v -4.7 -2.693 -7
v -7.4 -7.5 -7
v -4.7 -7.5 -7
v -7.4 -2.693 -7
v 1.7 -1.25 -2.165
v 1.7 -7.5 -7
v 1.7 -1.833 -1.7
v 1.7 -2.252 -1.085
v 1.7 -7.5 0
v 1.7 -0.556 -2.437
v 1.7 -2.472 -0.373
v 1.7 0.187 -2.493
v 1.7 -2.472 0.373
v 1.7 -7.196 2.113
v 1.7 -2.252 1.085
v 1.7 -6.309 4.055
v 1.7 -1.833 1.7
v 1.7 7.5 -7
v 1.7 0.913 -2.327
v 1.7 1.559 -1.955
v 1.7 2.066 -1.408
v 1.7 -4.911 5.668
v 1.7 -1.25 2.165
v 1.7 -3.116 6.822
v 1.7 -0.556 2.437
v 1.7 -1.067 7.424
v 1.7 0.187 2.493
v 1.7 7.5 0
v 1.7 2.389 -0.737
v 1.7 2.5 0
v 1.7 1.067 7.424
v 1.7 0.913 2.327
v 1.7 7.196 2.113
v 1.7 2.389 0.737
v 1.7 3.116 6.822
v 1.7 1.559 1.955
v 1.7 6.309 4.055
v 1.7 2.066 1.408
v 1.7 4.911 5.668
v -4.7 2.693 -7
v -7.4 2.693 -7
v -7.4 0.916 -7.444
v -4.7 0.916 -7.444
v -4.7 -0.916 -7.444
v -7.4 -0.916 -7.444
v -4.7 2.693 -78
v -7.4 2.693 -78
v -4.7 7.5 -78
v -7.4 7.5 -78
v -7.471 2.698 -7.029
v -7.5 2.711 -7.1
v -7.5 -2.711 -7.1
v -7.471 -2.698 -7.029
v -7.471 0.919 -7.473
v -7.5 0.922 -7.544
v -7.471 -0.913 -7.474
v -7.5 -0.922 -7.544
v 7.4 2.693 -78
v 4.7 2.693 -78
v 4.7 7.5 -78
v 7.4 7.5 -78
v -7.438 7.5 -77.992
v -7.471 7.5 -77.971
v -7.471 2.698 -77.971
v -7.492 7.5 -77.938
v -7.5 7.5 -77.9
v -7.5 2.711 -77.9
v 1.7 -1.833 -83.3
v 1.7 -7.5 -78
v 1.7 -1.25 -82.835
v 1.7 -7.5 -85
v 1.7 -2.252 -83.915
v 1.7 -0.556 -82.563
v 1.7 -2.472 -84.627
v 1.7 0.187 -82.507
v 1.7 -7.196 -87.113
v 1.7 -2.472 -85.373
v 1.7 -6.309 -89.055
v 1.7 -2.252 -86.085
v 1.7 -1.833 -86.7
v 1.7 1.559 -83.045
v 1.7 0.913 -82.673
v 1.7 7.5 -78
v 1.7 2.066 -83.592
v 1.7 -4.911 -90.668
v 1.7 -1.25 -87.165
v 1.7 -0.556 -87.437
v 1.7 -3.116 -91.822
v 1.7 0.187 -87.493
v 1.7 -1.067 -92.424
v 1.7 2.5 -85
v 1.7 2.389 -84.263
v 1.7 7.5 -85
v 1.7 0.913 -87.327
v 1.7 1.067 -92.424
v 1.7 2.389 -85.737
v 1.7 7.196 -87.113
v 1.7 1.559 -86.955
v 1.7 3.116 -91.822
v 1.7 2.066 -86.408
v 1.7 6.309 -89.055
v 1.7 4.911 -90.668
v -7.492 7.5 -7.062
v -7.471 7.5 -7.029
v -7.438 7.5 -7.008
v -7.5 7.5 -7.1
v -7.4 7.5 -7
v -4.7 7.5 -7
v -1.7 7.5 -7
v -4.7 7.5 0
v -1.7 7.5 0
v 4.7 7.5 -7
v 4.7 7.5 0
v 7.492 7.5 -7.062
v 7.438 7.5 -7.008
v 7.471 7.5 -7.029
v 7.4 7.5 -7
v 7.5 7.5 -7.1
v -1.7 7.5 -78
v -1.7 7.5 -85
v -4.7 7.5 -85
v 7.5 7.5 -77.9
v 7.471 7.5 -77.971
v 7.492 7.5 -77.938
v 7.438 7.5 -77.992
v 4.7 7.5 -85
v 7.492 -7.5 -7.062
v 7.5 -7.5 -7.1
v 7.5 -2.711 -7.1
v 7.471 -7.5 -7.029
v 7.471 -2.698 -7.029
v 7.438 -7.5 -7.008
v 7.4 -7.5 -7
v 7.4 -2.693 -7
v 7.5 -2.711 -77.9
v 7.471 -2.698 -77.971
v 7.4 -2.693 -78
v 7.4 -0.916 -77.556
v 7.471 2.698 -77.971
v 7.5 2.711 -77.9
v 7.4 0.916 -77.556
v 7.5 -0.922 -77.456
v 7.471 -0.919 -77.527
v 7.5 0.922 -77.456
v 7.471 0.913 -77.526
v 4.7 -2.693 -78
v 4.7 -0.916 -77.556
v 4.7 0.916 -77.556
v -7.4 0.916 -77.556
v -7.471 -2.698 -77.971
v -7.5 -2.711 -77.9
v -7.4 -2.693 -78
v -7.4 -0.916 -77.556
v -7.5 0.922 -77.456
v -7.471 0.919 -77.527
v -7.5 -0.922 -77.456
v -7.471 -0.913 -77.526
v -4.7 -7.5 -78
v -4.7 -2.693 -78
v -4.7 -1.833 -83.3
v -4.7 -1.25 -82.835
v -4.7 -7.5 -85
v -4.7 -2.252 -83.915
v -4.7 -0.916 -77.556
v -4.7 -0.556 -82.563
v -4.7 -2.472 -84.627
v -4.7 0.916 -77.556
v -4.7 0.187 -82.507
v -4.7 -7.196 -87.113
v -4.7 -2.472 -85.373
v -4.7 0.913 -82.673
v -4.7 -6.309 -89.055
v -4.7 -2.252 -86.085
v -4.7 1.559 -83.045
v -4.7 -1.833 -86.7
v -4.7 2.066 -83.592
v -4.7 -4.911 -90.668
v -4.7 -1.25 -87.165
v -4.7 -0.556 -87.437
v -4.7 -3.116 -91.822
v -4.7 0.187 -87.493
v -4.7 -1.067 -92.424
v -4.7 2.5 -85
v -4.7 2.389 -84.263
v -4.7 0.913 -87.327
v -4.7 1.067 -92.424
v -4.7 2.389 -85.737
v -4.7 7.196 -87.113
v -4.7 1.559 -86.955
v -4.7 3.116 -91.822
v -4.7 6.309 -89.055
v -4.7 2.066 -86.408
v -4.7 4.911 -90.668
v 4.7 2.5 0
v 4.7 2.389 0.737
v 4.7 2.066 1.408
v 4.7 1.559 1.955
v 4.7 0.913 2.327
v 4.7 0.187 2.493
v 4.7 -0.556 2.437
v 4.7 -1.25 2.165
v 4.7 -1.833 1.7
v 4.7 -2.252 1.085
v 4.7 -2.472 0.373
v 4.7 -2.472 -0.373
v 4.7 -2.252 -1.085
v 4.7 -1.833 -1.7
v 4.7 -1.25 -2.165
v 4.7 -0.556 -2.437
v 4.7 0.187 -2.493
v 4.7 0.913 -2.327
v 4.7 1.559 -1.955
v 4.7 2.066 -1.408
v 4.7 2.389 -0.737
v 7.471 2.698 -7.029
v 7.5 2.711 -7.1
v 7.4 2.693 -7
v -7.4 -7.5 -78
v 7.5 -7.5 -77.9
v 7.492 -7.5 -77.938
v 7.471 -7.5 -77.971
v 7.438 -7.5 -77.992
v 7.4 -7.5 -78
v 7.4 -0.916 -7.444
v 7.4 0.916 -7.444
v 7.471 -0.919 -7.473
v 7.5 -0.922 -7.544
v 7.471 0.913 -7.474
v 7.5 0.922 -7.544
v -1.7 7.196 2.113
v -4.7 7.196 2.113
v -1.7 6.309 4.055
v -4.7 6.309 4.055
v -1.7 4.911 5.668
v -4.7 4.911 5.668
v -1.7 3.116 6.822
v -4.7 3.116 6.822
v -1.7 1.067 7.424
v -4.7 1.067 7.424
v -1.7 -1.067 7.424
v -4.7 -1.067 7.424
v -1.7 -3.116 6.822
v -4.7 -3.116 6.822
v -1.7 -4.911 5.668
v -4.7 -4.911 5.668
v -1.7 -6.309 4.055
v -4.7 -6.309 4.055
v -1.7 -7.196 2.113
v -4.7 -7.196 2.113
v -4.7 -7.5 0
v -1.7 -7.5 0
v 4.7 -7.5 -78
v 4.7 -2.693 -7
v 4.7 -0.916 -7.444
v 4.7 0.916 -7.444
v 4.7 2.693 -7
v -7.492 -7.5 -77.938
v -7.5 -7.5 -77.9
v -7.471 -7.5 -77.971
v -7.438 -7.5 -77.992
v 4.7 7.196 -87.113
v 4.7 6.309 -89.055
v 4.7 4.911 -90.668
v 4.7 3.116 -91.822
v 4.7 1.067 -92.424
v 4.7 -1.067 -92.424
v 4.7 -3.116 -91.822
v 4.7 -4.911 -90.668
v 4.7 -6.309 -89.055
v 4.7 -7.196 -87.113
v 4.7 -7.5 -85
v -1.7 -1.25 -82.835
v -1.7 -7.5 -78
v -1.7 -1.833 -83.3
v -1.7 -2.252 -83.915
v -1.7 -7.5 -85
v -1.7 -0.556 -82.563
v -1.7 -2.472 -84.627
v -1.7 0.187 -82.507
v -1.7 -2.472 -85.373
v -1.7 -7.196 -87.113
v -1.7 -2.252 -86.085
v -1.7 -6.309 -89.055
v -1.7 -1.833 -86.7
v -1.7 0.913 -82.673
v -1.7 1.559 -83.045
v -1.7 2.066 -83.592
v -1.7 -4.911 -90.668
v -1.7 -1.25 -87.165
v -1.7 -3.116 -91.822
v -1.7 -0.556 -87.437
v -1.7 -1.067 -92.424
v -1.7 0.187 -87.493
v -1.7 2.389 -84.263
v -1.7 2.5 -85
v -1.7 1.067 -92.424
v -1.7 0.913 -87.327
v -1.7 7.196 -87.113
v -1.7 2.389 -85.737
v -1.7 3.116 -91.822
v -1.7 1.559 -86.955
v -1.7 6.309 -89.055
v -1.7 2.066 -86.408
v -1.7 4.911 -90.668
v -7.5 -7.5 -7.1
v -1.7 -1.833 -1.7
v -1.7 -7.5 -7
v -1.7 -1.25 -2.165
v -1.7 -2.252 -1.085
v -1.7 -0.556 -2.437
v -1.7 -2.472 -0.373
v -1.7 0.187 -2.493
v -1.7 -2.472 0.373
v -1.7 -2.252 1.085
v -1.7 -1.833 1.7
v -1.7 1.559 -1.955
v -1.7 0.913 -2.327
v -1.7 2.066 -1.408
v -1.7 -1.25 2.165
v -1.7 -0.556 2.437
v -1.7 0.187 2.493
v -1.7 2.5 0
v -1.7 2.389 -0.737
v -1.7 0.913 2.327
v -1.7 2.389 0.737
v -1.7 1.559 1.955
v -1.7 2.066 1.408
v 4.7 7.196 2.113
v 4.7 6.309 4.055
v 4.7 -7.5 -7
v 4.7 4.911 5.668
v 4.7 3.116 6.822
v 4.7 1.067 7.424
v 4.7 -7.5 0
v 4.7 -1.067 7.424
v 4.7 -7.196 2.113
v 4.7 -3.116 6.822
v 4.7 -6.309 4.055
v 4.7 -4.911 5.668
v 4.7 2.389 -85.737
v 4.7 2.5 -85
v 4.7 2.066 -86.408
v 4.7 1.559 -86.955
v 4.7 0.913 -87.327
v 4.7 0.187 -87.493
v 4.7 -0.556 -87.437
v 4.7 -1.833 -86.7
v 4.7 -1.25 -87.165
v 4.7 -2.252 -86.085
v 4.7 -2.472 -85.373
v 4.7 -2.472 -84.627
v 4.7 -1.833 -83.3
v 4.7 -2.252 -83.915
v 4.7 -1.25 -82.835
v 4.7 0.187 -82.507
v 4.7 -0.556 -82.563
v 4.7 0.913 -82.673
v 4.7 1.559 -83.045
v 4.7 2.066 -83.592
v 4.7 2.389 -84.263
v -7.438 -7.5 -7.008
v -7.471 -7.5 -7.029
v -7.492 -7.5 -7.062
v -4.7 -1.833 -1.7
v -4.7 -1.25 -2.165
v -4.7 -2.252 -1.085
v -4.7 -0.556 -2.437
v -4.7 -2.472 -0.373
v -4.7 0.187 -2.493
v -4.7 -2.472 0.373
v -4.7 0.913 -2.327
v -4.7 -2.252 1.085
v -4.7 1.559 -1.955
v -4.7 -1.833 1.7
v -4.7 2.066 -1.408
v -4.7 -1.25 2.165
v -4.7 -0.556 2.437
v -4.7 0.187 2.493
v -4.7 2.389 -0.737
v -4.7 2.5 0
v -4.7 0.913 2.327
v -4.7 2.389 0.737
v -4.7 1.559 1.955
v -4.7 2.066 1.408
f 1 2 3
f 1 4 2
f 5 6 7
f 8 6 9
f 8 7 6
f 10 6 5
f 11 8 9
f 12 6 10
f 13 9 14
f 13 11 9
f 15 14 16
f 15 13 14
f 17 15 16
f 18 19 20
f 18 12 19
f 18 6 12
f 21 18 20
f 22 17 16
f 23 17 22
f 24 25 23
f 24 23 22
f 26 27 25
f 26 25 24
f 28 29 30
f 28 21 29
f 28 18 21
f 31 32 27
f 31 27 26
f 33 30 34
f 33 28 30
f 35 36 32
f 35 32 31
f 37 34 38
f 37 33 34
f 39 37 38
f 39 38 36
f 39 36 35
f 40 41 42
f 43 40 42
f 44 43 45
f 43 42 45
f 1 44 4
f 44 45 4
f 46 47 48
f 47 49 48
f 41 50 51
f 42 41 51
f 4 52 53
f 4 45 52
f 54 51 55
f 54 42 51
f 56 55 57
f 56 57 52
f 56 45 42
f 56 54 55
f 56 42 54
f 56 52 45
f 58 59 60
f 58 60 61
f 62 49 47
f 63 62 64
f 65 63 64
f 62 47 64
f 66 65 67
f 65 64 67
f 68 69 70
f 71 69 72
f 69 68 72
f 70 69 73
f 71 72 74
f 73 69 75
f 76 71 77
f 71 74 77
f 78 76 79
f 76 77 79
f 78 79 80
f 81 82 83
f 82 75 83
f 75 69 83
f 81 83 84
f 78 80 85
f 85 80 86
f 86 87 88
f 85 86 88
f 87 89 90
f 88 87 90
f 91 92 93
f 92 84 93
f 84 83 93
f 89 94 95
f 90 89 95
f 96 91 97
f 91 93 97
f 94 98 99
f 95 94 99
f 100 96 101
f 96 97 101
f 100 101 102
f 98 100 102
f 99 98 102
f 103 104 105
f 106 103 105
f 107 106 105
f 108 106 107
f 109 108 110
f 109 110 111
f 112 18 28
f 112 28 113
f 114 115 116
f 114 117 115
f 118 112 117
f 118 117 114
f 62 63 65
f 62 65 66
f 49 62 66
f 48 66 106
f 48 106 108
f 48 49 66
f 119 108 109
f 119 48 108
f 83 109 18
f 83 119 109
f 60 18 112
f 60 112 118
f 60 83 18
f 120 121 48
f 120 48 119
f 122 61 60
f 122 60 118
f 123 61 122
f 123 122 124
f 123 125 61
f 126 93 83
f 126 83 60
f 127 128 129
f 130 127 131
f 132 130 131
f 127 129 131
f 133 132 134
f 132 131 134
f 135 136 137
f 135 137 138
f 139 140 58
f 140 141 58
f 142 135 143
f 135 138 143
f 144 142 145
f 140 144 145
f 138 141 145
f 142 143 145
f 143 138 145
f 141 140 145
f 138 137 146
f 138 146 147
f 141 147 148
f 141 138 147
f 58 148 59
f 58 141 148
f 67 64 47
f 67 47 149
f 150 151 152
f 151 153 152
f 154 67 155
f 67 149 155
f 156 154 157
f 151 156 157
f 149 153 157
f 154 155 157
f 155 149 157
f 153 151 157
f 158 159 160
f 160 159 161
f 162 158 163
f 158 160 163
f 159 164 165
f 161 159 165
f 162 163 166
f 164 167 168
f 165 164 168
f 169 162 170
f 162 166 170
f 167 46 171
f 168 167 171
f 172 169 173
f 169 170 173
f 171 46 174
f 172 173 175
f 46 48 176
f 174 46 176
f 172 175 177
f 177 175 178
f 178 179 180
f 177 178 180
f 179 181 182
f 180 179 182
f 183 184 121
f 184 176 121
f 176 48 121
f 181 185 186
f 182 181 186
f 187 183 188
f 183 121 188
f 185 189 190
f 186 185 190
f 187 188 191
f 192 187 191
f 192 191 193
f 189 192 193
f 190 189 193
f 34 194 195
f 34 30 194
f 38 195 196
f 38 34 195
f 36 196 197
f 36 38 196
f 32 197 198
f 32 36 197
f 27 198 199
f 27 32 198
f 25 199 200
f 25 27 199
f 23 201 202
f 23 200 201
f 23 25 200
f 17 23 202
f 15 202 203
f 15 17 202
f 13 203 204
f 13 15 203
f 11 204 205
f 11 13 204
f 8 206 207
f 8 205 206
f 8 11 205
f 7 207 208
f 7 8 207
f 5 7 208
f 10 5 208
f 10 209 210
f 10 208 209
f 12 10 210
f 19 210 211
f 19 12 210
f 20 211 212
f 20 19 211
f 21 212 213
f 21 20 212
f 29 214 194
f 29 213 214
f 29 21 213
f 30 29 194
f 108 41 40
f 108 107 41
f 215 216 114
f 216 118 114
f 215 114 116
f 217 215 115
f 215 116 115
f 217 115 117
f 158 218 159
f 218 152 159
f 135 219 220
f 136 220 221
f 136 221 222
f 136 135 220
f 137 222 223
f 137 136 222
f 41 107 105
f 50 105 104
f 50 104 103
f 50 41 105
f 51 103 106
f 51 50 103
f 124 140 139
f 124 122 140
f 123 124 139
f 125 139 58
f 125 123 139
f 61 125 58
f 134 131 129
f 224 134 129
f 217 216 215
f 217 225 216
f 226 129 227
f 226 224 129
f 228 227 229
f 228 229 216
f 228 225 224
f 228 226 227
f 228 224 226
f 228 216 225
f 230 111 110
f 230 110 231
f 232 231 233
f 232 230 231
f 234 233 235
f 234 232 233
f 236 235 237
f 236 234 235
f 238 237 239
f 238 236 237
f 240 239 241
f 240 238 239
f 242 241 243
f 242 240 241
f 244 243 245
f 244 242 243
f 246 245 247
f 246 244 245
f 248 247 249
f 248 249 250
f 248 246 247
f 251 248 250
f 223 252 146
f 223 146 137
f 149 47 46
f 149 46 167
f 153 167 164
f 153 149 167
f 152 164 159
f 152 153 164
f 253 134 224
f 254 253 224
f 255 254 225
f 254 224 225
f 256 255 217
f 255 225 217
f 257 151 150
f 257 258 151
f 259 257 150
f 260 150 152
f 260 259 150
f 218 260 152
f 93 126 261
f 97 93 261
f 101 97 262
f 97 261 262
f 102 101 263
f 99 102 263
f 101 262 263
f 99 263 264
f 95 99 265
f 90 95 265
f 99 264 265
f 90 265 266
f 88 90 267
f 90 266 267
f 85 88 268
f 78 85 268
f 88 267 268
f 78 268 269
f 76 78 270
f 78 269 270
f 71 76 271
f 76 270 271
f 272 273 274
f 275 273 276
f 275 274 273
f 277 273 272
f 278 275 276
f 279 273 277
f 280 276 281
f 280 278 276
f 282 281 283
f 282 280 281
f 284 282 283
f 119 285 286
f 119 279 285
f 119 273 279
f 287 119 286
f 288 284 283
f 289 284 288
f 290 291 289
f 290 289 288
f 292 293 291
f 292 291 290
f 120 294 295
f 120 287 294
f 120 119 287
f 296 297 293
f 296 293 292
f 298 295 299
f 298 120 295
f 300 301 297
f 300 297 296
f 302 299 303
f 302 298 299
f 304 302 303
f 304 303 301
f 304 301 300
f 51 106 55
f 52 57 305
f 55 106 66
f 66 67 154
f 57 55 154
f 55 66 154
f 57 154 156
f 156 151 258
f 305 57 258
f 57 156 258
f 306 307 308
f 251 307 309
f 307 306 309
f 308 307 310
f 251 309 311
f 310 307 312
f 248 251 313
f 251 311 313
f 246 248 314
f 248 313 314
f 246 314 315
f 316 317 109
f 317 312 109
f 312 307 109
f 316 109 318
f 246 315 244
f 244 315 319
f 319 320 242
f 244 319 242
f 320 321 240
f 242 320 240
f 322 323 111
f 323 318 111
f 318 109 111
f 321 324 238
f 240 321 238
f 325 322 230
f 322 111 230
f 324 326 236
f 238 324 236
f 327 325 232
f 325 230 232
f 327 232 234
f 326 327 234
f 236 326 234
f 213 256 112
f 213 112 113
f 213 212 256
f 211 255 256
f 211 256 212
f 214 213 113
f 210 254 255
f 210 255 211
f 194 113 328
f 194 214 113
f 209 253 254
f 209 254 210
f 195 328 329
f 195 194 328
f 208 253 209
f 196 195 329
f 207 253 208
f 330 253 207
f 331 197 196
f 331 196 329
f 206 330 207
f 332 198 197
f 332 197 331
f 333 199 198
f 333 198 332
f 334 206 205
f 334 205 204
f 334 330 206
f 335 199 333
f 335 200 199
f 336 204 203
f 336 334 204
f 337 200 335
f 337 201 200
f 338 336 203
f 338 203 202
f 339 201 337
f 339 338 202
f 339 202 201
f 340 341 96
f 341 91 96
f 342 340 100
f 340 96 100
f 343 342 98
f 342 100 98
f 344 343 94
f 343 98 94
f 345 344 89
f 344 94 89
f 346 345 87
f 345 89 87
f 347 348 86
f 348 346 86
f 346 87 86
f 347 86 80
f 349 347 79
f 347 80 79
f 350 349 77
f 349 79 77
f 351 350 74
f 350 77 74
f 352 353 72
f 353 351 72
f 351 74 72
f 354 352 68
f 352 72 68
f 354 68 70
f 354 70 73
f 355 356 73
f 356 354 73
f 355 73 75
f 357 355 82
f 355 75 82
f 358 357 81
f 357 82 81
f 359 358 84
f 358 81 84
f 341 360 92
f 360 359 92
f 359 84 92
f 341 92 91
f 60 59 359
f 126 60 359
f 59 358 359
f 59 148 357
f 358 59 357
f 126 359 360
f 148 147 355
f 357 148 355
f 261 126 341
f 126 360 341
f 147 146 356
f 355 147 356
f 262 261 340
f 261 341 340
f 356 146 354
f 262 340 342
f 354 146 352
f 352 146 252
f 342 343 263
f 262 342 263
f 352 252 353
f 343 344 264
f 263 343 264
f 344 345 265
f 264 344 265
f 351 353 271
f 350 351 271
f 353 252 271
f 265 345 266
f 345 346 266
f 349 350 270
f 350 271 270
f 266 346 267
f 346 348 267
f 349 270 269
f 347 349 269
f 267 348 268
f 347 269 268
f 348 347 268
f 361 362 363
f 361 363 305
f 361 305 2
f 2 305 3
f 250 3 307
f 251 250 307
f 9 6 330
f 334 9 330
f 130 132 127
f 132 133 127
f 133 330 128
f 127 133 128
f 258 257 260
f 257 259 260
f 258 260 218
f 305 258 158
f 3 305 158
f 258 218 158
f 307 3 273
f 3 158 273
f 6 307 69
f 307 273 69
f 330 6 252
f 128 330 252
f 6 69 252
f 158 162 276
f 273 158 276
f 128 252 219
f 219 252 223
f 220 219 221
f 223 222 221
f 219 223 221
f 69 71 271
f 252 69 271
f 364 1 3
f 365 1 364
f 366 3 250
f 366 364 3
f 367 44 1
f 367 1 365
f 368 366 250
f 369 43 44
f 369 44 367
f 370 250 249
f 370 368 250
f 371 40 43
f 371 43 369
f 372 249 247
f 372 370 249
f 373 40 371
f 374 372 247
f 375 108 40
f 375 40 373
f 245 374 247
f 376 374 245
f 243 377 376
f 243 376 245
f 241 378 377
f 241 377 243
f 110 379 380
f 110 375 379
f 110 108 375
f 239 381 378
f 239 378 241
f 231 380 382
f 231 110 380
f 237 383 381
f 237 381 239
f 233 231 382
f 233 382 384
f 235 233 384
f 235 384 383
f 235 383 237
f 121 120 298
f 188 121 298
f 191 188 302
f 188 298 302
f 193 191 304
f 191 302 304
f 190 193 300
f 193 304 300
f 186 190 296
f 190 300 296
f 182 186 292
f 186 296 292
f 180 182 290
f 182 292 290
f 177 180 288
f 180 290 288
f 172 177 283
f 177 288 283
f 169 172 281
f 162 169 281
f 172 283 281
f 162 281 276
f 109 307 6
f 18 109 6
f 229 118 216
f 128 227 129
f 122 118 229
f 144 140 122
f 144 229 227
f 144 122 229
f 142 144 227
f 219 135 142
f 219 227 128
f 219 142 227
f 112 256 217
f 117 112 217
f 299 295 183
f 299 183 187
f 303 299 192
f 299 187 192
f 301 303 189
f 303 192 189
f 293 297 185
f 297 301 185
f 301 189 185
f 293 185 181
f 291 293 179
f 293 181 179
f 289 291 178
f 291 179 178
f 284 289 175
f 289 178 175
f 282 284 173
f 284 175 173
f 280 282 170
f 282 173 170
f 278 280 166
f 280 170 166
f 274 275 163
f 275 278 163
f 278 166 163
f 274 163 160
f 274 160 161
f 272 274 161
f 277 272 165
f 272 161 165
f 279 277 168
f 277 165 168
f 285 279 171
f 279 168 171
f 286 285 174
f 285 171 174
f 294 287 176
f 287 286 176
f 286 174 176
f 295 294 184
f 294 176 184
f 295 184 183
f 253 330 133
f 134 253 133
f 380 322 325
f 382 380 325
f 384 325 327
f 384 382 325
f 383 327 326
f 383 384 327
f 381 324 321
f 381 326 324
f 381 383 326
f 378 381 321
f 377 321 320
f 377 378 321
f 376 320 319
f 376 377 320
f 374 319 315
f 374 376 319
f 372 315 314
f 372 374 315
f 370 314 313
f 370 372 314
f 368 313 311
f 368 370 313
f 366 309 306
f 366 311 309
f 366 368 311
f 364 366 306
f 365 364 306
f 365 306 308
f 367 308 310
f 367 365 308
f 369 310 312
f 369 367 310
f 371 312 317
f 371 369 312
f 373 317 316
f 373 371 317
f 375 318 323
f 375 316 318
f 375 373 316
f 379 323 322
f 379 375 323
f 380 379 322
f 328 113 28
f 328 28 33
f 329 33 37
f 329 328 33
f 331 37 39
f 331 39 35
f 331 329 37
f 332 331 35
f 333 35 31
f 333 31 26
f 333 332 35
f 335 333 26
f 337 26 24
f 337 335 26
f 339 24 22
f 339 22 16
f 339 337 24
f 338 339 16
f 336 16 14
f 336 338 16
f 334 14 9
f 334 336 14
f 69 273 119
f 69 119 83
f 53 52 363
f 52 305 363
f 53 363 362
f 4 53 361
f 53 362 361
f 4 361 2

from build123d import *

# Parameters (mm, degrees)
F1_R         = 2.5
F2_DEPTH     = 7.5
F3_W         = 3.4
F3_H         = 15.4505071864
F3_W_2       = 3.8797123611
F3_W_3       = 3.8316924378
F4_DEPTH     = 16.41578
F6_DEPTH     = 2.8
F8_DEPTH     = 2.8
F9_R         = 0.1
F10_R        = 2.5
F11_DEPTH    = 7.5
F12_W        = 3
F12_H        = 7.5577301905
F13_DEPTH    = 15.0010001
F14_T1_DEPTH = 16.5892781094
F16_W        = 15
F16_H        = 15
F17_DEPTH    = 30


# Not quite as in the source:
# - a fillet or chamfer that OpenCascade refuses, or shapes differently, is made with other operations: its cross-section is extruded or revolved along the edge and cut away or added


with BuildPart() as f2:
    # F1 (on Right) → F2 (new body, symmetric)
    with BuildSketch(Plane.YZ):
        with BuildLine():
            Line((7.5, -12.5), (7.5, 0))
            ThreePointArc((7.5, 0), (0, 7.5), (-7.5, 0))
            Line((-7.5, 0), (-7.5, -12.5))
            Line((-7.5, -12.5), (7.5, -12.5))
        make_face()
        Circle(F1_R, mode=Mode.SUBTRACT)
    extrude(amount=F2_DEPTH, both=True)

    # F3 (on Front) → F4 (cut, symmetric)
    with BuildSketch(Plane.XZ):
        with Locations((0, 0.7252535932)):
            Rectangle(F3_W, F3_H)
        with Locations((-6.6398561805, 0.7252535932)):
            Rectangle(F3_W_2, F3_H)
        with Locations((6.6158462189, 0.7252535932)):
            Rectangle(F3_W_3, F3_H)
    extrude(amount=F4_DEPTH, both=True, mode=Mode.SUBTRACT)

    # F5 (on face) → F6 (cut, through all)
    with BuildSketch(Plane(origin=(-7.5, 0, 0), x_dir=(0, -1, 0), z_dir=(-1, 0, 0))):
        with BuildLine():
            ThreePointArc((2.6925824036, -7), (6.1824092402, -4.2459175671), (7.5, 0))
            ThreePointArc((7.5, 0), (-4.2459175671, 6.1824092402), (-2.6925824036, -7))
            Line((-2.6925824036, -7), (2.6925824036, -7))
        make_face()
        with BuildLine():
            Line((2.6925824036, -7), (-2.6925824036, -7))
            ThreePointArc((-2.6925824036, -7), (0, -7.5), (2.6925824036, -7))
        make_face()
    extrude(amount=-F6_DEPTH, mode=Mode.SUBTRACT)

    # F7 (on face) → F8 (cut, through all)
    with BuildSketch(Plane.YZ.offset(7.5)):
        with BuildLine():
            Line((2.6925824036, -7), (-2.6925824036, -7))
            ThreePointArc((-2.6925824036, -7), (0, -7.5), (2.6925824036, -7))
        make_face()
        with BuildLine():
            ThreePointArc((2.6925824036, -7), (6.1824092402, -4.2459175671), (7.5, 0))
            ThreePointArc((7.5, 0), (-4.2459175671, 6.1824092402), (-2.6925824036, -7))
            Line((-2.6925824036, -7), (2.6925824036, -7))
        make_face()
    extrude(amount=-F8_DEPTH, mode=Mode.SUBTRACT)

    # F9
    f9_edges = [f2.edges().sort_by_distance(p)[0] for p in [
        (7.5, -5.096291, -7),
        (7.5, 0, -7.5),
        (7.5, 5.096291, -7),
        (-7.5, 5.096291, -7),
        (-7.5, 0, -7.5),
        (-7.5, -5.096291, -7),
    ]]
    fillet(f9_edges, radius=F9_R)

    # F16 (on face) → F17 (join)
    with BuildSketch(Plane(origin=(0, 0, -12.5), x_dir=(1, 0, 0), z_dir=(0, 0, -1))):
        Rectangle(F16_W, F16_H)
    extrude(amount=F17_DEPTH)

    # F18: F2 across face


with BuildPart() as f11:
    # F10 (on Right) → F11 (new body, symmetric)
    with BuildSketch(Plane.YZ):
        with BuildLine():
            Line((-7.5, 15.0892781094), (-7.5, 0))
            ThreePointArc((-7.5, 0), (0, -7.5), (7.5, 0))
            Line((7.5, 0), (7.5, 15.0892781094))
            Line((7.5, 15.0892781094), (-7.5, 15.0892781094))
        make_face()
        Circle(F10_R, mode=Mode.SUBTRACT)
    extrude(amount=F11_DEPTH, both=True)

    # F12 (on face) → F13 (cut, through all)
    with BuildSketch(Plane.XZ.offset(7.5)):
        with Locations((-3.2, 3.7788650952)):
            Rectangle(F12_W, F12_H)
        with Locations((3.2, 3.7788650952)):
            Rectangle(F12_W, F12_H)
    extrude(amount=-F13_DEPTH, mode=Mode.SUBTRACT)

    # F14: fillet of radius 0.1 on 4 edges, made by hand

    # F14_s2 → F14_t1 (cut)
    with BuildSketch(Plane.XY.offset(-1.25)):
        with BuildLine():
            ThreePointArc((-7.4, 7.5), (-7.4707106781, 7.4707106781), (-7.5, 7.4))
            Line((-7.5, 7.4), (-7.5, 7.5))
            Line((-7.5, 7.5), (-7.4, 7.5))
        make_face()
        with BuildLine():
            ThreePointArc((-7.5, -7.4), (-7.4707106781, -7.4707106781), (-7.4, -7.5))
            Line((-7.4, -7.5), (-7.5, -7.5))
            Line((-7.5, -7.5), (-7.5, -7.4))
        make_face()
        with BuildLine():
            ThreePointArc((7.4, 7.5), (7.4707106781, 7.4707106781), (7.5, 7.4))
            Line((7.5, 7.4), (7.5, 7.5))
            Line((7.5, 7.5), (7.4, 7.5))
        make_face()
        with BuildLine():
            ThreePointArc((7.5, -7.4), (7.4707106781, -7.4707106781), (7.4, -7.5))
            Line((7.4, -7.5), (7.5, -7.5))
            Line((7.5, -7.5), (7.5, -7.4))
        make_face()
    extrude(amount=F14_T1_DEPTH, mode=Mode.SUBTRACT)


with BuildPart() as f2_1:
    add(f2.part)
    add(f2.part.mirror(Plane(origin=(0, 0, -42.5), x_dir=(1, 0, 0), z_dir=(0, 0, -1))))


solid = f2_1.part
